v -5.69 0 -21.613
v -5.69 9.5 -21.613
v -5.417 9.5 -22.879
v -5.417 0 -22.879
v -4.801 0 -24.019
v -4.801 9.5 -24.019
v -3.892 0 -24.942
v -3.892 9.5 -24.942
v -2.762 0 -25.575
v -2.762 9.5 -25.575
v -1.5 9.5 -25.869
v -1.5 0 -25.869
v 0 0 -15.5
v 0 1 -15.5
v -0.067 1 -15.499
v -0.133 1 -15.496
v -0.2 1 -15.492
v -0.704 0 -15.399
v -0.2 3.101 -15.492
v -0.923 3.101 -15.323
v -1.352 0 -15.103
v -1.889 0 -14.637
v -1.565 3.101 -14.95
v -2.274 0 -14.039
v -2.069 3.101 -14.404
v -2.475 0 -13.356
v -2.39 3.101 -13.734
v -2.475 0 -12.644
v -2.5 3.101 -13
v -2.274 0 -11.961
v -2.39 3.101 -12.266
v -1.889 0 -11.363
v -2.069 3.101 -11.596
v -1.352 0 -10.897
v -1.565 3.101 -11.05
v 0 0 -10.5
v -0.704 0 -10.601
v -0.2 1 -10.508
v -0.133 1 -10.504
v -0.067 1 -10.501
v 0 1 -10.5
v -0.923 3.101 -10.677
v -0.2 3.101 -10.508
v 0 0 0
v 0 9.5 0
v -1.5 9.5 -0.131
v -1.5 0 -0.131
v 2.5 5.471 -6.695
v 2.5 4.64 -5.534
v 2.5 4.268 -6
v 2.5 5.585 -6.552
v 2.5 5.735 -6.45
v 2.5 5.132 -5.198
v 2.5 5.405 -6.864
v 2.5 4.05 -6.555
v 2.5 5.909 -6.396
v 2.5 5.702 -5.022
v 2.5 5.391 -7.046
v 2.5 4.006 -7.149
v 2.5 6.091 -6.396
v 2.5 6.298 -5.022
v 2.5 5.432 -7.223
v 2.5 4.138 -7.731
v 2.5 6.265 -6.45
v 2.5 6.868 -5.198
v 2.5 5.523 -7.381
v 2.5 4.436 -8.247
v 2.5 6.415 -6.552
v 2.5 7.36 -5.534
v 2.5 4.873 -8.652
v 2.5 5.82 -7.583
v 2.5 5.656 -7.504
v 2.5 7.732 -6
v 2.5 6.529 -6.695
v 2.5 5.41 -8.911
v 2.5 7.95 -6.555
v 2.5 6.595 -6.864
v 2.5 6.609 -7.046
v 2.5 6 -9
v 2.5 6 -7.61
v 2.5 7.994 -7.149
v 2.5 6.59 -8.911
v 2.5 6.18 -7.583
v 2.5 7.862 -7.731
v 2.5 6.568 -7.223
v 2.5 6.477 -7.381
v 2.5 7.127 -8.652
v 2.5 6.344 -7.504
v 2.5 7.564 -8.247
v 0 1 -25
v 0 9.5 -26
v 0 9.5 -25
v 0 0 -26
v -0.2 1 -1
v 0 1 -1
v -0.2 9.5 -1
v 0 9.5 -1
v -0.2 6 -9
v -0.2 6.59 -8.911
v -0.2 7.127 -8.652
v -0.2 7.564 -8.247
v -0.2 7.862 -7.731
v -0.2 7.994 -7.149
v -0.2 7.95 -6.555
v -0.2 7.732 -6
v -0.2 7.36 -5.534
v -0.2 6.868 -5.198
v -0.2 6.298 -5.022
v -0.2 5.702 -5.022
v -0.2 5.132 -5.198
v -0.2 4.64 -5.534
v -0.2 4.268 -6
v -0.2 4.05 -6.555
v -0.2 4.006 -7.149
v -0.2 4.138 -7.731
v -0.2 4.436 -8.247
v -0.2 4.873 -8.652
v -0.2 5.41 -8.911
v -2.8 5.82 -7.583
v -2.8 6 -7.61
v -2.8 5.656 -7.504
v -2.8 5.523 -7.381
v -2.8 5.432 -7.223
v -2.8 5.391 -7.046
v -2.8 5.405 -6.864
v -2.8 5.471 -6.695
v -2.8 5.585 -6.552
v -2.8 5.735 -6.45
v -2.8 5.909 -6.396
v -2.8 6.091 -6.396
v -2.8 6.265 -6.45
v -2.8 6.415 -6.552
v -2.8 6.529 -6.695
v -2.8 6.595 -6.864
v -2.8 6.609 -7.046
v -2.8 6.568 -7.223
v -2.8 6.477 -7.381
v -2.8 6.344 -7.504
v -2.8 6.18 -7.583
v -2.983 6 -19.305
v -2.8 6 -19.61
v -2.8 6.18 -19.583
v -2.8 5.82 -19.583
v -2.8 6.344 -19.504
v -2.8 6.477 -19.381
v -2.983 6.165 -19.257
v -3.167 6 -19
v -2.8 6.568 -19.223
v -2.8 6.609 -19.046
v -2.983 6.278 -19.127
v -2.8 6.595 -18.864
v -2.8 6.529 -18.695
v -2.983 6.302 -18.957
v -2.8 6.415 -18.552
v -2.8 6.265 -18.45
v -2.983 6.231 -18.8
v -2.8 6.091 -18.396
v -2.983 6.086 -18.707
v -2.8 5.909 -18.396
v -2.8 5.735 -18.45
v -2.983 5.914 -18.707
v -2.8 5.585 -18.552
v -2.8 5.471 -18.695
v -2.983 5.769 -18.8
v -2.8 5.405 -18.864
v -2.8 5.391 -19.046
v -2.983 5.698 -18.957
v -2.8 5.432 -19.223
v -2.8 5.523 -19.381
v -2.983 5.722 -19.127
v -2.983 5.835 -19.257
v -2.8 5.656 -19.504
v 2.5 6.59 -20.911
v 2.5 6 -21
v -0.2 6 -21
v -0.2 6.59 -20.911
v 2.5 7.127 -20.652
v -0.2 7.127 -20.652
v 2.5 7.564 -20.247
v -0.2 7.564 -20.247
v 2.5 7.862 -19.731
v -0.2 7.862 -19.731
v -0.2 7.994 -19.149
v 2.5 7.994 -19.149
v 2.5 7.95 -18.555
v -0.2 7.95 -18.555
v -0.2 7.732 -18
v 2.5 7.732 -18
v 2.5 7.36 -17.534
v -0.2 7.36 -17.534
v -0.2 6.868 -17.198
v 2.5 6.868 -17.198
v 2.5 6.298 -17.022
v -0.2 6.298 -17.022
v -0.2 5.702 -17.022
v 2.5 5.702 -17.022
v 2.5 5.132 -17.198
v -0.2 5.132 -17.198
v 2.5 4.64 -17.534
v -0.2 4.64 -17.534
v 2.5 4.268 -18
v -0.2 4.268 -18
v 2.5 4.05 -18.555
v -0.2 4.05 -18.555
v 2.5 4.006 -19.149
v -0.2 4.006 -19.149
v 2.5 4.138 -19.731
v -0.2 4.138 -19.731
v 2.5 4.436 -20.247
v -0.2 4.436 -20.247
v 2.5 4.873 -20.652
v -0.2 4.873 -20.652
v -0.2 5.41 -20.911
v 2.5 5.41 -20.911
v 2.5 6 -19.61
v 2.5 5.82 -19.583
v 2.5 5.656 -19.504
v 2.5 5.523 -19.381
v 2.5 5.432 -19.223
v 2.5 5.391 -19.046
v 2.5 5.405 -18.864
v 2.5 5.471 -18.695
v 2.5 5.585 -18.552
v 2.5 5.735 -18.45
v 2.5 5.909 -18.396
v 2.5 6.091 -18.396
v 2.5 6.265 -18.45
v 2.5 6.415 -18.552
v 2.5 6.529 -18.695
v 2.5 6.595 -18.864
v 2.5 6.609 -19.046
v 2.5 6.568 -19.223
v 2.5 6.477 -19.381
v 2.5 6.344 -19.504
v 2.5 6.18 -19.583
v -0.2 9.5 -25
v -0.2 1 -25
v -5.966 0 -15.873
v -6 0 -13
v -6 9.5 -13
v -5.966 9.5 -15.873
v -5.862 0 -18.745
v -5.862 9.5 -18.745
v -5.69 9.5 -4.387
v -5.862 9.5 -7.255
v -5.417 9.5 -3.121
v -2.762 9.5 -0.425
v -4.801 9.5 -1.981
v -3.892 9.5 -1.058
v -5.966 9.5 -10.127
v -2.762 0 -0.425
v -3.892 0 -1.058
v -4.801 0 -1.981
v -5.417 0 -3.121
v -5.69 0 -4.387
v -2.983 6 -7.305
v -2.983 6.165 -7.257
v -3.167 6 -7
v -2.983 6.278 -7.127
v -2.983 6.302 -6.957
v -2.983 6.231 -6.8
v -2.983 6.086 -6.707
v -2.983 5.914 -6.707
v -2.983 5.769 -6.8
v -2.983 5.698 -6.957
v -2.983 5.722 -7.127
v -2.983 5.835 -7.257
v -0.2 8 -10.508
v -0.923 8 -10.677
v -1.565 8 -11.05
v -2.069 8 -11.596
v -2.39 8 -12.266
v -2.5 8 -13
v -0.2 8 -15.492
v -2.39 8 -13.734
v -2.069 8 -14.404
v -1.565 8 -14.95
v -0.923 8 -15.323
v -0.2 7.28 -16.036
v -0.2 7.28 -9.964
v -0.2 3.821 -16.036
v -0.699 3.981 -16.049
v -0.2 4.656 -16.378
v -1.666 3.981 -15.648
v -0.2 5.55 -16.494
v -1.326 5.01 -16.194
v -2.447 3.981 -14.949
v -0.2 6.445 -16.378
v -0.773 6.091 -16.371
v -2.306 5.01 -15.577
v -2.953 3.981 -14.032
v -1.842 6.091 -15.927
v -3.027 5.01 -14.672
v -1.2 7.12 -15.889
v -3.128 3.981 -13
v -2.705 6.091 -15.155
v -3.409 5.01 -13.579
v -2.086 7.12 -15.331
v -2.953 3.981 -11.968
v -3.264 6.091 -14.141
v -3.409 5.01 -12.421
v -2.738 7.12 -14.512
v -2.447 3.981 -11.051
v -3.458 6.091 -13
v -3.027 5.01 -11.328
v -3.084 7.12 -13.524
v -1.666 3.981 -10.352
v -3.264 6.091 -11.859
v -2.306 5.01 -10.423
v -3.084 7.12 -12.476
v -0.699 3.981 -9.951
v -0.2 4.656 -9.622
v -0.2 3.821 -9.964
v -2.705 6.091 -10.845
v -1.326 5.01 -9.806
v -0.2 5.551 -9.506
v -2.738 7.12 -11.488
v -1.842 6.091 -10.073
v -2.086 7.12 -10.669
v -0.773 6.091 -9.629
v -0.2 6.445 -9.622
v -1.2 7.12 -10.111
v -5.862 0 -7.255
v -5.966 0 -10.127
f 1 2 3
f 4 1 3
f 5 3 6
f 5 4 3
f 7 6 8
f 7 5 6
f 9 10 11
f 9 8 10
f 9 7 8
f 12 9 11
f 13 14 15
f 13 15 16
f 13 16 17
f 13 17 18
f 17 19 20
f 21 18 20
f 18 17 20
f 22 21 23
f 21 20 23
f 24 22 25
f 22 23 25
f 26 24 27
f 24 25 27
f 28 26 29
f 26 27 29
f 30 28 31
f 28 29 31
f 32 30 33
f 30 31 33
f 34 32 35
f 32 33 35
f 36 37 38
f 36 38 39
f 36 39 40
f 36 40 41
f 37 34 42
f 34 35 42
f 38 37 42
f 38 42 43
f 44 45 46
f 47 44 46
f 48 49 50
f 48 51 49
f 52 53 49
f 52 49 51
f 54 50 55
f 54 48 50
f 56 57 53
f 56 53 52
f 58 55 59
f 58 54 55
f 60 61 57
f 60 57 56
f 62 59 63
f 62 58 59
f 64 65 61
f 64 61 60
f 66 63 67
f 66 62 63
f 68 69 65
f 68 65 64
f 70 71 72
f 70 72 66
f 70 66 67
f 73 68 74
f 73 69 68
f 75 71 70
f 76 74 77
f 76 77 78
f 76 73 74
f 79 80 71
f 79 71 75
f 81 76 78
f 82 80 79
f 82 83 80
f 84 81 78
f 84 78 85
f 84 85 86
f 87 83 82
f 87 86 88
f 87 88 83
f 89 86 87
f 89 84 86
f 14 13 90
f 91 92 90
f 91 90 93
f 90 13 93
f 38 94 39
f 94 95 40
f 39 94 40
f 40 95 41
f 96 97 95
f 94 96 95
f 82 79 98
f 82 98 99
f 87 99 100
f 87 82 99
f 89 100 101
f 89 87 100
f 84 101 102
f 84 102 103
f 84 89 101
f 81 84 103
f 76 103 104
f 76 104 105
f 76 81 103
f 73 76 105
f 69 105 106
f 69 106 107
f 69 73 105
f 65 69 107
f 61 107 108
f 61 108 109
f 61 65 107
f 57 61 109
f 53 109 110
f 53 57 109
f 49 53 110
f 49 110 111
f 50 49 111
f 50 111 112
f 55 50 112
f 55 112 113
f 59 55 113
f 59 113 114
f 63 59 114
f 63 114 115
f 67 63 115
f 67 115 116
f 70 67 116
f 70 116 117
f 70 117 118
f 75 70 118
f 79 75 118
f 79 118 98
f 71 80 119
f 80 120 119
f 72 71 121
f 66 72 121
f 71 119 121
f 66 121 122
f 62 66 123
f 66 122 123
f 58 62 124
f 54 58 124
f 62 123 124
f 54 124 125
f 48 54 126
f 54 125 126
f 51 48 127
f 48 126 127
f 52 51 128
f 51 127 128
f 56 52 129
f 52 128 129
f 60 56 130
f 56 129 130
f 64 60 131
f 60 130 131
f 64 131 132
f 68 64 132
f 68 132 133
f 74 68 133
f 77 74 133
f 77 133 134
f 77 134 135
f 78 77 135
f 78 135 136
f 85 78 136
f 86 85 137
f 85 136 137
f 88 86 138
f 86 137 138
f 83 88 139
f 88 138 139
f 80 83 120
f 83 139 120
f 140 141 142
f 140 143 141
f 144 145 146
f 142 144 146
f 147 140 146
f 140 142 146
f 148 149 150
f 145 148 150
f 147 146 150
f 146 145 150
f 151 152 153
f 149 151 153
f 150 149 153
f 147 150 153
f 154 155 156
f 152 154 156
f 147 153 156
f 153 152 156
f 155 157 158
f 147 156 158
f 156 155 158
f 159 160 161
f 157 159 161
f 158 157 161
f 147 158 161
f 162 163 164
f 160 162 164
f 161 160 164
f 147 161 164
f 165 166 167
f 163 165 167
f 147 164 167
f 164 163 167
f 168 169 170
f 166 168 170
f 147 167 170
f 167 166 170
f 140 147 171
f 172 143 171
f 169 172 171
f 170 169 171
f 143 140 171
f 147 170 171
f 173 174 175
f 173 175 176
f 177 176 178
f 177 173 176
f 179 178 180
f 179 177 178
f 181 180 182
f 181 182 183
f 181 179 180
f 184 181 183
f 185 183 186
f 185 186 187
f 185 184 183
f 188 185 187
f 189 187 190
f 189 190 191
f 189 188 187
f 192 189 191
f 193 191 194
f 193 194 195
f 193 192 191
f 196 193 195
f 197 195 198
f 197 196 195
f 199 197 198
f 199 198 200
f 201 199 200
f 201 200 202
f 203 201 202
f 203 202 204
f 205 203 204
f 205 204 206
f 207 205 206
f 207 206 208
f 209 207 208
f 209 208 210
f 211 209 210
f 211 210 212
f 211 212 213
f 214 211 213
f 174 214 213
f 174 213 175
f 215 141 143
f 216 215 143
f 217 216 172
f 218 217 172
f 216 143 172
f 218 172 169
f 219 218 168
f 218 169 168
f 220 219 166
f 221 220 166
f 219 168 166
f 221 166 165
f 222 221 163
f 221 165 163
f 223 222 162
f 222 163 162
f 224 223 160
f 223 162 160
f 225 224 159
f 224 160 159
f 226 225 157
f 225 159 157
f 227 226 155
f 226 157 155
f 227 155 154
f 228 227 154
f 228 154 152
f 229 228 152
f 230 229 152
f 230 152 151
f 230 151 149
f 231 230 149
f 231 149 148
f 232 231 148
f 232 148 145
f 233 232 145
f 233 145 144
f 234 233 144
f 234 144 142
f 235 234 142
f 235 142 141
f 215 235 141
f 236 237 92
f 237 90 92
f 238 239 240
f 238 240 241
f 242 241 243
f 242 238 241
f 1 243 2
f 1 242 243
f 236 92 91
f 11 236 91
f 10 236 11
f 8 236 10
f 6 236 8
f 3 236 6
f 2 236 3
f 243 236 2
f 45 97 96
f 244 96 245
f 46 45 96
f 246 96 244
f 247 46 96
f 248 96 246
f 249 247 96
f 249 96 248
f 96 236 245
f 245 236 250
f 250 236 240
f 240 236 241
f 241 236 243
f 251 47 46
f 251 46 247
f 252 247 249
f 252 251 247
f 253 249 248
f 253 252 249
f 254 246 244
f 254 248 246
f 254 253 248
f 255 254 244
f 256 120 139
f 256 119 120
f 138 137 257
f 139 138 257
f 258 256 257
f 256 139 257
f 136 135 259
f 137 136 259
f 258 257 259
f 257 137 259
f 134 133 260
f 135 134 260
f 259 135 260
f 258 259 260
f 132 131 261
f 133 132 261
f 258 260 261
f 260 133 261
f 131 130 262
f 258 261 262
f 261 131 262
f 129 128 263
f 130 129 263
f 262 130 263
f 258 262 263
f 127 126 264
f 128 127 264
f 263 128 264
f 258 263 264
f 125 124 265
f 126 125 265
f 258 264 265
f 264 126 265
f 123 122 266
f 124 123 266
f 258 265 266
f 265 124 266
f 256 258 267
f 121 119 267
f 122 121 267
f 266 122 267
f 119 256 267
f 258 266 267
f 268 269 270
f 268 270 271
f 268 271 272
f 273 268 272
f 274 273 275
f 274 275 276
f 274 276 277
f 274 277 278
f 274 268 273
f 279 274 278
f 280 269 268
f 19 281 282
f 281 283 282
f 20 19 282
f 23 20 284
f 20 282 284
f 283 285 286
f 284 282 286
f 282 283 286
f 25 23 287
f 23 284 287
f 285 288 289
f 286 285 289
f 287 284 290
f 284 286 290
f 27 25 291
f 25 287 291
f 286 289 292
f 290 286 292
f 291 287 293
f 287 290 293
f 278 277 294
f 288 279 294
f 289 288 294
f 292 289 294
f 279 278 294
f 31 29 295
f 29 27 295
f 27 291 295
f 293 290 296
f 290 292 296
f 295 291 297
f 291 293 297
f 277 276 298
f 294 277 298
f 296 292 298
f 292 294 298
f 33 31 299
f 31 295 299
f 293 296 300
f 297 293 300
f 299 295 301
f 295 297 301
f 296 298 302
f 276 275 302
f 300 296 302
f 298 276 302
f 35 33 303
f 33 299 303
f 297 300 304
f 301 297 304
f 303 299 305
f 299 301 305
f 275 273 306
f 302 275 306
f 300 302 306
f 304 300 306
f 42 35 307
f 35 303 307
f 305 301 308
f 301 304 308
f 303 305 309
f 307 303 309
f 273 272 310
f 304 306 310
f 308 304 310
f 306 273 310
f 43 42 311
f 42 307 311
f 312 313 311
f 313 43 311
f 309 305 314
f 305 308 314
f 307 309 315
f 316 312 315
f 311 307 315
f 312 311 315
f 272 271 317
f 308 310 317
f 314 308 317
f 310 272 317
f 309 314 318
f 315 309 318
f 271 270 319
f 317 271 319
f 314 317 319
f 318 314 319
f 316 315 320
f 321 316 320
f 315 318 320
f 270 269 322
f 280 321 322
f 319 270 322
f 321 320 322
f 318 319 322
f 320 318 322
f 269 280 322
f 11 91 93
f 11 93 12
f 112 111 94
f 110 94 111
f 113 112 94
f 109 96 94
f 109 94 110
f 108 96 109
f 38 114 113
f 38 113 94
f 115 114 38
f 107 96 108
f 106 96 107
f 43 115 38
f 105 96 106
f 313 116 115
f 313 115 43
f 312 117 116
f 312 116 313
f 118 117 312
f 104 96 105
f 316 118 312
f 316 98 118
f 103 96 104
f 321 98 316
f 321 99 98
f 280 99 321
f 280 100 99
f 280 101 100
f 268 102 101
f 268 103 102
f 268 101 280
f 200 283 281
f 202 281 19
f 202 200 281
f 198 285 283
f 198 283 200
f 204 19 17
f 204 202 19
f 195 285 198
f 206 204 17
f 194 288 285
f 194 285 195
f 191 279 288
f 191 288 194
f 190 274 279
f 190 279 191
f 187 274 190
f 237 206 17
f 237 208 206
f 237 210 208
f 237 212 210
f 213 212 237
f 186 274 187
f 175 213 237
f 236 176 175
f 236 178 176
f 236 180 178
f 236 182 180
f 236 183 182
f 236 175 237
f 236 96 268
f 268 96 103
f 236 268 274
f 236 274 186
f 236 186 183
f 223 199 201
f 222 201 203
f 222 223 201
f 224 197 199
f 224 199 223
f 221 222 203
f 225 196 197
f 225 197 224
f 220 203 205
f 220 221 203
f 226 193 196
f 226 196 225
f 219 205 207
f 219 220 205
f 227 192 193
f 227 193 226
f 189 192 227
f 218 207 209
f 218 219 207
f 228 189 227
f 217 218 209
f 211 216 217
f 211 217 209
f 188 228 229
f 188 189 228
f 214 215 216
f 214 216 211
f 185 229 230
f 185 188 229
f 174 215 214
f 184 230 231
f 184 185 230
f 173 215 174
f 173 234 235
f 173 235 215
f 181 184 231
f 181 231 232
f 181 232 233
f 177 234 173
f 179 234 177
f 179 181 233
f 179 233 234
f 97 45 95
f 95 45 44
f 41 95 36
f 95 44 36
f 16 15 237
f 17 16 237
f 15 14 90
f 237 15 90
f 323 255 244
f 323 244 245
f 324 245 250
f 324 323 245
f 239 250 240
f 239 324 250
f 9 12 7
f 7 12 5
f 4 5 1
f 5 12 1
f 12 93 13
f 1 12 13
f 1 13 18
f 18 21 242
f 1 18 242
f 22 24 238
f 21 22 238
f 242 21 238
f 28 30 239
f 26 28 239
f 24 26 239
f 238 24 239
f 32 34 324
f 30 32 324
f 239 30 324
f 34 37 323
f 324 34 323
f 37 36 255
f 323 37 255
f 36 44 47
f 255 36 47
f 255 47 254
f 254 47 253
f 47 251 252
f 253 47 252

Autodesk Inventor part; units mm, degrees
ref_plane "YZ Plane" through (0, 0, 0) normal (1, 0, 0) x (0, 1, 0)
ref_plane "XZ Plane" through (0, 0, 0) normal (0, 1, 0) x (-1, 0, 0)
ref_plane "XY Plane" through (0, 0, 0) normal (0, 0, 1) x (1, 0, 0)
sketch "Sketch1" plane through (0, 0, 0) normal (0, 1, 0) x (-1, 0, 0)
  line L0 (0, 0) -> (0, -26)
  line L1 (0, -26) -> (1.5, -25.8688)
  line L2 (-5, -13) -> (15, -13) construction
  line L3 (0, 0) -> (1.5, -0.1312)
  arc A0 (1.5, -25.8688) -> (5.6905, -21.6131) centre (1.0988, -21.2827) ccw
  arc A1 (5.6905, -4.3869) -> (1.5, -0.1312) centre (1.0988, -4.7173) ccw
  arc A2 (5.6905, -21.6131) -> (6, -13) centre (-114, -13) ccw
  arc A3 (6, -13) -> (5.6905, -4.3869) centre (-114, -13) ccw
  dimension "d0" = 26
  dimension "d1" = 85
  dimension "d2" = 1.5
  dimension "d3" = 6
  dimension "d4" = 120
extrude "Extrusion1" add sketch "Sketch1" along normal blind 9.5
sketch "Sketch2" plane through (0, 0, 0) normal (1, 0, 0) x (0, 0, -1)
  circle A0 centre (7, 6) radius 2
  circle A1 centre (19, 6) radius 2
  line L0 (0, 0) -> (26, 0) construction
  line L1 (26, 0) -> (26, 9.5) construction
  line L2 (0, 9.5) -> (1, 9.5) construction
  line L3 (0, 0) -> (0, 9.5) construction
  line L4 (1, 9.5) -> (1, 1)
  line L5 (1, 1) -> (25, 1)
  line L6 (25, 1) -> (25, 9.5)
  line L7 (0, 0) -> (0, 9.5) construction
  line L8 (0, 9.5) -> (1, 9.5) construction
  line L9 (26, 0) -> (26, 9.5) construction
  line L10 (1, 9.5) -> (25, 9.5)
  line L11 (25, 9.5) -> (26, 9.5) construction
  dimension "d7" = 1
  dimension "d8" = 1
  dimension "d9" = 1
extrude "Extrusion2" cut sketch "Sketch2" against normal blind 0.2
sketch "Sketch3" plane through (0, 6, -7) normal (1, 0, 0) x (0, 0, -1)
  circle A0 centre (0, 0) radius 2 projected
  circle A1 centre (0, 0) radius 2
  circle A2 centre (12, 0) radius 2
  point P0 (-7, -6)
extrude "Extrusion3" add sketch "Sketch3" along normal blind 2.5
sketch "Sketch4" plane through (2.5, 6, -7) normal (1, 0, 0) x (0, 0, -1)
  circle A0 centre (12, 0) radius 2 projected
  point P0 (-7, -6)
  point P1 (0, 0)
hole "Hole1" at (2.5, 6, -7) at (2.5, 6, -19) direction (-1, 0, 0) diameter 1.221 depth 5.3 tip angle 118 thread size "M1.6x0.35" class "6H" standard "ANSI Metric M Profile"
sketch "Sketch5" plane through (0, 0, 0) normal (1, 0, 0) x (0, 0, -1)
  line L0 (21.6131, 9.5) -> (4.3869, 9.5) construction
  line L1 (13, 9.5) -> (13, -3) construction
  line L2 (10.5, 8) -> (13, 8) construction
  arc A0 (15.5, 3.101) -> (15.5, 8) centre (13, 5.5505) ccw
  line L3 (21.6131, 0) -> (4.3869, 0) construction
  line L4 (10.5, 0) -> (10.5, 3.101) construction
  line L5 (15.5, 0) -> (15.5, 3.101)
  line L6 (13, 9.0505) -> (13, 8) construction
  arc A1 (13, 2.0505) -> (15.5, 3.101) centre (13, 5.5505) ccw construction
  arc A2 (13, 9.0505) -> (13, 2.0505) centre (13, 5.5505) ccw construction
  arc A3 (15.5, 8) -> (13, 9.0505) centre (13, 5.5505) ccw construction
  line L7 (13, 8) -> (15.5, 8)
  line L8 (13, 8) -> (13, 0)
  line L9 (13, 0) -> (15.5, 0)
  point P0 (0, 0)
  dimension "d24" = 1.5
  dimension "d25" = 5
  dimension "d26" = 7
  dimension "d27" = 5
revolve "Revolution1" cut sketch "Sketch5" angle 360 about axis through (0, 8, -13) along (0, -1, 0)
equation "\"d9\" = d7"
